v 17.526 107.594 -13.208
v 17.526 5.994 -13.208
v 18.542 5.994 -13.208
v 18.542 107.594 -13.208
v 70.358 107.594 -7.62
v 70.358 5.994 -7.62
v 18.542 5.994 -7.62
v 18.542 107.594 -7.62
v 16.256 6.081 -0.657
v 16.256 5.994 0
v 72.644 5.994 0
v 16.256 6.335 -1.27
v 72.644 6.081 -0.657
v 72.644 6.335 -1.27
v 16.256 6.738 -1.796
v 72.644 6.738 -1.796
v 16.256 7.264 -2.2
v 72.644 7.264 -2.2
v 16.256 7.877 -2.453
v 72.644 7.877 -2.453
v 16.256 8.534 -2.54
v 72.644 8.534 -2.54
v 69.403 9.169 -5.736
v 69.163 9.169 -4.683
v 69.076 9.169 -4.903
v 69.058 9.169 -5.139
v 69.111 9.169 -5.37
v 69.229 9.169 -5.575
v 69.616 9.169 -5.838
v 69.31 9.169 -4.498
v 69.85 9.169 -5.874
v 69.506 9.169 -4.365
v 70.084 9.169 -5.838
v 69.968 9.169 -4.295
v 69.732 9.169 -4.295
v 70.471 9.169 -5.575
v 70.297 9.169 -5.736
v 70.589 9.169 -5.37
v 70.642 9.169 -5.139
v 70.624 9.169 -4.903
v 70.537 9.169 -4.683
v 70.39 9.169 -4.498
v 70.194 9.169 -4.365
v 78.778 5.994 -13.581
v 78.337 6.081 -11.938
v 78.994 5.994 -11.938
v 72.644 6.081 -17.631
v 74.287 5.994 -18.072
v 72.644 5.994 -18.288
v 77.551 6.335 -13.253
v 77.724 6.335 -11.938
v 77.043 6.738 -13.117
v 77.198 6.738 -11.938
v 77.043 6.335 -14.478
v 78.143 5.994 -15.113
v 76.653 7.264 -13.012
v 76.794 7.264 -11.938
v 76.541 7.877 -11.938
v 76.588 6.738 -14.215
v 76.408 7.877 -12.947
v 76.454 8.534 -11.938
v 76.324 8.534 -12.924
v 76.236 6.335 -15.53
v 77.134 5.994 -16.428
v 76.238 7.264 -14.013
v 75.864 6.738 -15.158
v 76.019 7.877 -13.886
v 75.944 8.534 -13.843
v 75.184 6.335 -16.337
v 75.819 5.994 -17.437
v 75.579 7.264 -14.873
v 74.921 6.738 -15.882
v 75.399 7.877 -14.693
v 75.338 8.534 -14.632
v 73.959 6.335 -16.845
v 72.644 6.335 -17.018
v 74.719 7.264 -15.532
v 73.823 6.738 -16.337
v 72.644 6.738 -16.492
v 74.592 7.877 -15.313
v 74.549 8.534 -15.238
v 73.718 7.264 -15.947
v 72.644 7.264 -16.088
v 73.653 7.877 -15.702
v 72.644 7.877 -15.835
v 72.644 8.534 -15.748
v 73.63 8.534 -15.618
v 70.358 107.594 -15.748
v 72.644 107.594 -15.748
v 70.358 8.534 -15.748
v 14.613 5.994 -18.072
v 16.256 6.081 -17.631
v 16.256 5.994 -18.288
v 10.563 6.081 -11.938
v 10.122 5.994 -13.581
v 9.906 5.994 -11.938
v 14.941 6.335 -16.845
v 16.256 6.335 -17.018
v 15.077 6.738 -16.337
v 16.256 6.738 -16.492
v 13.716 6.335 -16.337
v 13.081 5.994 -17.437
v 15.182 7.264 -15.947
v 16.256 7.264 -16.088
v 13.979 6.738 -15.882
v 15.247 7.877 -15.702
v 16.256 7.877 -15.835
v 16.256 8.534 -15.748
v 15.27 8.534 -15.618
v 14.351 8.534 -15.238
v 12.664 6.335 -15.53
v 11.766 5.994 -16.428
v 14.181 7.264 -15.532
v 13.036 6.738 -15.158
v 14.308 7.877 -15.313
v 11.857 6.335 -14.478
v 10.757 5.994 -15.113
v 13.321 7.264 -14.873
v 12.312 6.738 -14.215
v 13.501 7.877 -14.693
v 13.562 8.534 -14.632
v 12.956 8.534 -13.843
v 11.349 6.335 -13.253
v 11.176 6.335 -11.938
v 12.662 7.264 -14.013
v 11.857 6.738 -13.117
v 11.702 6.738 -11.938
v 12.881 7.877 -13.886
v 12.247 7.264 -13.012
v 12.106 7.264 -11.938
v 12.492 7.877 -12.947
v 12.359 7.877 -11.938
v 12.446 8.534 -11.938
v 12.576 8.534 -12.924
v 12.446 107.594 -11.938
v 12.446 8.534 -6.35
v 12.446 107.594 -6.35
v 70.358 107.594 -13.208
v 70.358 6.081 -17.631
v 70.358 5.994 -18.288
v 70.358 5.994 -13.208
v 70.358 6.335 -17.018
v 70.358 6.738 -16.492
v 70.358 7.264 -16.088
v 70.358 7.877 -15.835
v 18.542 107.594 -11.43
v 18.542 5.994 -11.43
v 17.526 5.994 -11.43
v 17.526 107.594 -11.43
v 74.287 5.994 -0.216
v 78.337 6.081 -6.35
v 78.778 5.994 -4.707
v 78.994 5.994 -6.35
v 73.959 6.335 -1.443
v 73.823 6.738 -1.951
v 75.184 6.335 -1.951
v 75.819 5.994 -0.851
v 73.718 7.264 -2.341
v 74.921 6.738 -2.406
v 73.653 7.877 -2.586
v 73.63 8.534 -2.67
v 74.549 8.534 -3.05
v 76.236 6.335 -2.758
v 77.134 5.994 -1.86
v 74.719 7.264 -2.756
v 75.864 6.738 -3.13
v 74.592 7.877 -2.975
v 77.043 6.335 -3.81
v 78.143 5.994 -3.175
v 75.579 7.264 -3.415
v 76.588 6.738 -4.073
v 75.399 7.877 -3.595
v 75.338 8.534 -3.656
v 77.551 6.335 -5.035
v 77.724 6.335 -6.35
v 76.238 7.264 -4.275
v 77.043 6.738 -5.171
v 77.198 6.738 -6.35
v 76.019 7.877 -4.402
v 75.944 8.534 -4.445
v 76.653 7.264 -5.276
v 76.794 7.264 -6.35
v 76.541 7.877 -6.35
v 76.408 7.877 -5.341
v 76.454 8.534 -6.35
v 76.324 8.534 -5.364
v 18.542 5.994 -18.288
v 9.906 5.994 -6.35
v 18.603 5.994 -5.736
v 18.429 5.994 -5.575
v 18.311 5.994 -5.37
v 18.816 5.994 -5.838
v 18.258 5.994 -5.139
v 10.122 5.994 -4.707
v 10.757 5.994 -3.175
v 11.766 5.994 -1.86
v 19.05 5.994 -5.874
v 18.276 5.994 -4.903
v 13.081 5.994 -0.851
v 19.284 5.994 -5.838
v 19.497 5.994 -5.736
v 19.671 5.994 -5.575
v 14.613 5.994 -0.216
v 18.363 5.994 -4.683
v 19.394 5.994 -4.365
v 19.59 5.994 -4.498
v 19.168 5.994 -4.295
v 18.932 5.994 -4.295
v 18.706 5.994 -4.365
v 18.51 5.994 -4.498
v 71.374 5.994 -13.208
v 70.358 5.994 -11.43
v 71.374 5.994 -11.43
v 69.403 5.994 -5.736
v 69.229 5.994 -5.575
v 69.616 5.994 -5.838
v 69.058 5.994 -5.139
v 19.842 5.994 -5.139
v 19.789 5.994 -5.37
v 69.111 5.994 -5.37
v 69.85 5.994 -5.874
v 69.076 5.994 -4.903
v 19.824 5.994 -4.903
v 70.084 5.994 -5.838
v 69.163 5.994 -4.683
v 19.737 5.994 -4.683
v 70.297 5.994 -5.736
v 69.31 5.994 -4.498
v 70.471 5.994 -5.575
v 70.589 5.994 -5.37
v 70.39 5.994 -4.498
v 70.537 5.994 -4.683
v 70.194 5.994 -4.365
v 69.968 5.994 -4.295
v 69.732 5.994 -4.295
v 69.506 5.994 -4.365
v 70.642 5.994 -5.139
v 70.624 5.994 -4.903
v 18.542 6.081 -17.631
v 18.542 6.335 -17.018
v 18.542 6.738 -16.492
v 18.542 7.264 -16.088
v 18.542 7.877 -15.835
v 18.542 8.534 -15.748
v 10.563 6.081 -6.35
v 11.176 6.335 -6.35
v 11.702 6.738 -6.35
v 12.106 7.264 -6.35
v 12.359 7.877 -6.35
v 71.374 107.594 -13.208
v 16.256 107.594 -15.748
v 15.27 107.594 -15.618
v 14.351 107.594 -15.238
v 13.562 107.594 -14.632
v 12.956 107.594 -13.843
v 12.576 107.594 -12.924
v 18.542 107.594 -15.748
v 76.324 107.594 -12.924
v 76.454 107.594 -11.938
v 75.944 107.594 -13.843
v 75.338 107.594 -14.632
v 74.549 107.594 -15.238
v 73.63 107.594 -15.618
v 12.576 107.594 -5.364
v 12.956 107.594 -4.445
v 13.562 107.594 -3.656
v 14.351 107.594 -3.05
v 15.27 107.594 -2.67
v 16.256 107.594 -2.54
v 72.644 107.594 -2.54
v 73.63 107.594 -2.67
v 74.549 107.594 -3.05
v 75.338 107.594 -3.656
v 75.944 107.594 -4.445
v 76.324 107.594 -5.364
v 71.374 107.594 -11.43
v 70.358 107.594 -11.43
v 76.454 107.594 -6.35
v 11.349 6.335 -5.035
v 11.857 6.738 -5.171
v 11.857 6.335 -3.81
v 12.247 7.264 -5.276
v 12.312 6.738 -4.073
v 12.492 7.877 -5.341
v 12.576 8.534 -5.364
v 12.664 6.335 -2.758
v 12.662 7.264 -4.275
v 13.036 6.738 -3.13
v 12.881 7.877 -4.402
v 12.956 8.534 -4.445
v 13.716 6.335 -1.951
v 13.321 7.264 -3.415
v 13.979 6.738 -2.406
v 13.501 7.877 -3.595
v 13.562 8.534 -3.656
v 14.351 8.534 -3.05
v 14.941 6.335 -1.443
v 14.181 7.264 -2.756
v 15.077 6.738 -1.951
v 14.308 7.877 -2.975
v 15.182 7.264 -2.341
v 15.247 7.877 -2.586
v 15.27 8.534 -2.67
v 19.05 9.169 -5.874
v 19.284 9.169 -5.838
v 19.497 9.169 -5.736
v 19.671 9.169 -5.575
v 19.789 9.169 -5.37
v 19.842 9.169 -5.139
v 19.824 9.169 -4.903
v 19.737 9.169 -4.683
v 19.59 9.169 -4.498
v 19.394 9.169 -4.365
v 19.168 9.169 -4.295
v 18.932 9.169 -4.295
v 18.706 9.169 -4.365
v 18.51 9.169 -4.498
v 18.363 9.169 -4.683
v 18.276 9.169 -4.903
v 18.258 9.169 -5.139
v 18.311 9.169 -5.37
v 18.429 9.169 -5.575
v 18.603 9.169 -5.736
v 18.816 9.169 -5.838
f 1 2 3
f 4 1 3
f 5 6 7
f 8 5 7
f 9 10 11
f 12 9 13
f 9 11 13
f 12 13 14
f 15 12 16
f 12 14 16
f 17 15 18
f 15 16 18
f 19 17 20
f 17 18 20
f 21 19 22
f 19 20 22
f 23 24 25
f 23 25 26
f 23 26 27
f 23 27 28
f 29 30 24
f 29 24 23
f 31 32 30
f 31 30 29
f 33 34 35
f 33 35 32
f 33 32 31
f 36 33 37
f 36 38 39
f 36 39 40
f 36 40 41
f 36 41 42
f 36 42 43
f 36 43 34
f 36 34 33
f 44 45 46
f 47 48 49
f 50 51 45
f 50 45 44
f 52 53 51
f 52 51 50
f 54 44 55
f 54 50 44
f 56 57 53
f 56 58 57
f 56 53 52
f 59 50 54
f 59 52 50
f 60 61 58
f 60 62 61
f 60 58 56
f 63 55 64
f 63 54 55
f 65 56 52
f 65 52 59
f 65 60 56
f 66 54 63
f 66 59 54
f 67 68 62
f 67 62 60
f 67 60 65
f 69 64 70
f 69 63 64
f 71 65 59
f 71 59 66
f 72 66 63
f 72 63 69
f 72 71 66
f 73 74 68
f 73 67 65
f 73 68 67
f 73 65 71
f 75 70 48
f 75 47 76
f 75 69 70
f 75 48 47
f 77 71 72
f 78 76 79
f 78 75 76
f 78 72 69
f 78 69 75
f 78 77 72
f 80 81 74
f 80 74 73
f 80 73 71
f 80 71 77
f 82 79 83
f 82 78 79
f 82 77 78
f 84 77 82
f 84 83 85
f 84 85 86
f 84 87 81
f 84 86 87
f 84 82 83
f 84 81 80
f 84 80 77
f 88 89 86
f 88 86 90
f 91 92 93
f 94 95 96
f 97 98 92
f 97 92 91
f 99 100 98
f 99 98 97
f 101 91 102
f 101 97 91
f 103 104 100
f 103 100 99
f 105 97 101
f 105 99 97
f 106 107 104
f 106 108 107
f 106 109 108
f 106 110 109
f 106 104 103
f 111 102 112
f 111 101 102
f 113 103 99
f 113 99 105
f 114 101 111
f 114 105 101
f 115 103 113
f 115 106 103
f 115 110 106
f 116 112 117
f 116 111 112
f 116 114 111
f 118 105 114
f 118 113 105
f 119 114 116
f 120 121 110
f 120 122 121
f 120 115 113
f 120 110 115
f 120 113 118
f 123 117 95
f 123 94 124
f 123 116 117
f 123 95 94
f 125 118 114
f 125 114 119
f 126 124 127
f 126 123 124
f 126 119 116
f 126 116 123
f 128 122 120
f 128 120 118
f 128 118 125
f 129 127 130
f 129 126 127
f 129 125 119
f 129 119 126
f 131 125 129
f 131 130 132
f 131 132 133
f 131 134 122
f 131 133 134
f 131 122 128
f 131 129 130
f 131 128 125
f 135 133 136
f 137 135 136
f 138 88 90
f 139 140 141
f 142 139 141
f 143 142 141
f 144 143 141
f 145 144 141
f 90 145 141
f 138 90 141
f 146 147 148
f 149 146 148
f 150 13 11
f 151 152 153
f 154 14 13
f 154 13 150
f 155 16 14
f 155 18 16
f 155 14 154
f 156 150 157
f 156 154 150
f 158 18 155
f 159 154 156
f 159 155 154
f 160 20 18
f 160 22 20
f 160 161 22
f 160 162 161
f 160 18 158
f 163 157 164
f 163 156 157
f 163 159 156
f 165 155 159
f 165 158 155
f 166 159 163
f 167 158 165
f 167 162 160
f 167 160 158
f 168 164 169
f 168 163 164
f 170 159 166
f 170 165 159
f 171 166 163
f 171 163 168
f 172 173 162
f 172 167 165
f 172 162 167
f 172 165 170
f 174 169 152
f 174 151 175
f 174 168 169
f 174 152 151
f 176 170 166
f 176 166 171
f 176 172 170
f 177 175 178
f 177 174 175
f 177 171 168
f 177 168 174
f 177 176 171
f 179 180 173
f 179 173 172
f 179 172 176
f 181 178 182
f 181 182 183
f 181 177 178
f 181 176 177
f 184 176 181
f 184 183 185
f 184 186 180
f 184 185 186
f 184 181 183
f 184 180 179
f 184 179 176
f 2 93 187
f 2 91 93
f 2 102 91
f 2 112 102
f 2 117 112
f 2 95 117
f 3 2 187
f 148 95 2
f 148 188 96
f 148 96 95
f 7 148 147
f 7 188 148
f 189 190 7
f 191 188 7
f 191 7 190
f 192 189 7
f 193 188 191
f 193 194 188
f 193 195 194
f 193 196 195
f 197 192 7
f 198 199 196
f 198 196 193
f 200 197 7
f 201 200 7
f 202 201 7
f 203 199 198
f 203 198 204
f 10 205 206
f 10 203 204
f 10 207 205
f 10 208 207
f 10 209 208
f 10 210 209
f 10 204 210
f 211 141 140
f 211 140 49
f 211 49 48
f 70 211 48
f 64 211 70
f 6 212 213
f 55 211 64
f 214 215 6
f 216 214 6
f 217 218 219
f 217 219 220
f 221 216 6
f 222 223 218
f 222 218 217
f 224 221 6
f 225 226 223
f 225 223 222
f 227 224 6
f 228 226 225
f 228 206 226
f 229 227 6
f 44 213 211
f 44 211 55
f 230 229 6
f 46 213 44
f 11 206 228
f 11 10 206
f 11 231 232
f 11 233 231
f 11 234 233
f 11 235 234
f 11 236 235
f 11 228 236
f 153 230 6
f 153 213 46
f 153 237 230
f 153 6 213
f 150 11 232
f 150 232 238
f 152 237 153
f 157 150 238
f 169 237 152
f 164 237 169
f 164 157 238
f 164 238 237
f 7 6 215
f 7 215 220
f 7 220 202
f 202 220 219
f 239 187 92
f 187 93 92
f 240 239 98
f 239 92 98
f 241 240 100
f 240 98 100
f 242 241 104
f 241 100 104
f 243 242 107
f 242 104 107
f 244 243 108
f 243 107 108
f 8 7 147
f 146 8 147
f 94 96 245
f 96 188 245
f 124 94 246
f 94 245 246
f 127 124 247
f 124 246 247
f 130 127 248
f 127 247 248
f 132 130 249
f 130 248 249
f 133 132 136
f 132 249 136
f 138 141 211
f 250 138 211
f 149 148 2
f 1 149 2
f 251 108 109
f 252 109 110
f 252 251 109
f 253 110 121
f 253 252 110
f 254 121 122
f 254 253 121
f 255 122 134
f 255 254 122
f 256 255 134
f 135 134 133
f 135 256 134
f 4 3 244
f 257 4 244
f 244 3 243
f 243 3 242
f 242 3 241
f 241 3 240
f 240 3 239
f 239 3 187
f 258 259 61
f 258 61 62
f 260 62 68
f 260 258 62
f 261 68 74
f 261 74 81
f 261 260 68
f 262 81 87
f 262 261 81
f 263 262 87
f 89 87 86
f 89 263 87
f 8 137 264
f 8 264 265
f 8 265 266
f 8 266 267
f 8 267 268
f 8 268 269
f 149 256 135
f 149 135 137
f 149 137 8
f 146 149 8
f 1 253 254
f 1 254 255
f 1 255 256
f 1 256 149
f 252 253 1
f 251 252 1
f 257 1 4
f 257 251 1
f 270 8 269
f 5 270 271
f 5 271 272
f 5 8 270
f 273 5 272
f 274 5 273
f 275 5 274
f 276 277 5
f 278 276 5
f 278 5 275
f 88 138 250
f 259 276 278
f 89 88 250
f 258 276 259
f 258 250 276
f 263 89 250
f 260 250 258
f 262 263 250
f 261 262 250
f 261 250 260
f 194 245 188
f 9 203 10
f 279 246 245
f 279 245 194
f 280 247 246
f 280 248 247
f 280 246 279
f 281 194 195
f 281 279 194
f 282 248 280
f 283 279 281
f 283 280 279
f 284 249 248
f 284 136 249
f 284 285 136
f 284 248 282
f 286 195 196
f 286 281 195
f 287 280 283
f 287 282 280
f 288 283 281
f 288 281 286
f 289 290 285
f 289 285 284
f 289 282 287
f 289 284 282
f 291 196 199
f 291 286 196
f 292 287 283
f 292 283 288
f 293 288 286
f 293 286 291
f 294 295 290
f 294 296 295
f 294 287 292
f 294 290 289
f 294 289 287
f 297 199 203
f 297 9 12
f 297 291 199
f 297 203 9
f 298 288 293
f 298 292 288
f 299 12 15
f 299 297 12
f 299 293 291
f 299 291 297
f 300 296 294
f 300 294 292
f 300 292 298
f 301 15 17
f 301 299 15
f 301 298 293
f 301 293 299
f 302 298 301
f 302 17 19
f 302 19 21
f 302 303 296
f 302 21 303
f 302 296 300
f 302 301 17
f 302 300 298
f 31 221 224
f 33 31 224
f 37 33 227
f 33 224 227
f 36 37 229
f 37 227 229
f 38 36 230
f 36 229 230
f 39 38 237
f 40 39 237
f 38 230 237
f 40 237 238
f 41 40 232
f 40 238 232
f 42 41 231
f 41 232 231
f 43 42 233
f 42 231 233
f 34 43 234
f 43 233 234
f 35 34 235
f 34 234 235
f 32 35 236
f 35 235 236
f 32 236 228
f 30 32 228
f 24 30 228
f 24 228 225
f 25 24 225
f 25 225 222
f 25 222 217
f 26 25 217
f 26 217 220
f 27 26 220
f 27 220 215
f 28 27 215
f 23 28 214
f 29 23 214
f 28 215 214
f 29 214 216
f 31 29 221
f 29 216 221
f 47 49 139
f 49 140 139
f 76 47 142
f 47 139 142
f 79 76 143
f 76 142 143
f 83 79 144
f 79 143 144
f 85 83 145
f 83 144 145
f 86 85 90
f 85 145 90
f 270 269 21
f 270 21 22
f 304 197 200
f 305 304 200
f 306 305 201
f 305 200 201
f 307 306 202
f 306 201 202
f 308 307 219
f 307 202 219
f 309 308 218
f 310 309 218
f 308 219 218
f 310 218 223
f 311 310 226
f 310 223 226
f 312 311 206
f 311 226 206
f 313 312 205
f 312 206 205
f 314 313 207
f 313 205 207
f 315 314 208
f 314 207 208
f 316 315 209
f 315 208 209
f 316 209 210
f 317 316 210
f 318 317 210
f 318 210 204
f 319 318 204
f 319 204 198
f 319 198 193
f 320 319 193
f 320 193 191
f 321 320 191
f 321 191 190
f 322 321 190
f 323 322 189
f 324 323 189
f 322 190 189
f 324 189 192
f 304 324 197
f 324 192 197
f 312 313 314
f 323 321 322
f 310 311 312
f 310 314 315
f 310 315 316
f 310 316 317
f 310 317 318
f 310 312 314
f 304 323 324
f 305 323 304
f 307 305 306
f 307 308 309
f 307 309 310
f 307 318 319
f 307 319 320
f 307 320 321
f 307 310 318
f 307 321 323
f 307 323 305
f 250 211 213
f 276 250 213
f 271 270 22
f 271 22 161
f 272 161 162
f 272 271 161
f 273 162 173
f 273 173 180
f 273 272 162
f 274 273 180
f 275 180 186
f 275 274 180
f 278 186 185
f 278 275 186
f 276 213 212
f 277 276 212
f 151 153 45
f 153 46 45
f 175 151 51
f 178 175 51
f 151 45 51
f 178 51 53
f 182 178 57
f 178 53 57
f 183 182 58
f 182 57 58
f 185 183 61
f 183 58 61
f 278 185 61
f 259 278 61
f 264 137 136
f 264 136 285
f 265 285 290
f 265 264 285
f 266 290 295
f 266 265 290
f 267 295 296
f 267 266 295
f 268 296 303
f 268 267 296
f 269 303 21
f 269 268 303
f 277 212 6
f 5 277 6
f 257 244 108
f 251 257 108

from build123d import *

# Parameters (mm, degrees)
SKETCH2_W               = 88.9
SKETCH2_H               = 152.4
BOSS_EXTRUDE1_DEPTH     = 5.9944
CUT_EXTRUDE2_DEPTH      = 177.535840076
CUT_EXTRUDE2_DEPTH_BACK = 177.535840076
SKETCH4_R               = 2.7305
BOSS_EXTRUDE2_DEPTH     = 101.6
FILLET1_R               = 3.81
FILLET2_R               = 2.54
BOSS_EXTRUDE3_DEPTH     = 20.32
FILLET3_R               = 3.81
FILLET6_R               = 3.81
FILLET7_R               = 2.54
CUT_EXTRUDE3_DEPTH      = 204.596488182
CUT_EXTRUDE3_DEPTH_BACK = 204.596488182
SKETCH7_W               = 2.54
SKETCH7_H               = 152.4
SKETCH8_W               = 86.36
SKETCH8_H               = 152.4
CUT_EXTRUDE5_DEPTH      = 5.9944
SKETCH9_R               = 0.79375
CUT_EXTRUDE6_DEPTH      = 3.175


with BuildPart() as part:
    # Sketch2 → Boss-Extrude1 (new body)
    with BuildSketch(Plane(origin=(0, 0, 0), x_dir=(1, 0, 0), z_dir=(0, 1, 0))):
        with Locations((44.45, 76.2)):
            Rectangle(SKETCH2_W, SKETCH2_H)
    extrude(amount=BOSS_EXTRUDE1_DEPTH)

    # Sketch4 → Cut-Extrude2 (cut, two sides: drawn at the far end of the back side and taken through both)
    with BuildSketch(Plane(origin=(0, 5.9944, 0), x_dir=(1, 0, 0), z_dir=(0, 1, 0)).offset(-CUT_EXTRUDE2_DEPTH_BACK)):
        with Locations(Location((45.72, 109.871331367, 0), (0, 0, 270))):
            Circle(SKETCH4_R)
        with Locations(Location((45.72, 33.671331367, 0), (0, 0, 270))):
            Circle(SKETCH4_R)
    extrude(amount=CUT_EXTRUDE2_DEPTH + CUT_EXTRUDE2_DEPTH_BACK, mode=Mode.SUBTRACT)

    # Sketch5 → Boss-Extrude2 (add)
    with BuildSketch(Plane(origin=(0, 5.9944, 0), x_dir=(1, 0, 0), z_dir=(0, 1, 0))):
        Polygon((18.542, 15.748), (12.446, 15.748), (12.446, 2.54), (76.454, 2.54), (76.454, 15.748), (70.358, 15.748), (70.358, 13.208), (71.374, 13.208), (71.374, 11.43), (70.358, 11.43), (70.358, 7.62), (18.542, 7.62), (18.542, 11.43), (17.526, 11.43), (17.526, 13.208), (18.542, 13.208), align=None)
    extrude(amount=BOSS_EXTRUDE2_DEPTH)

    # Fillet1
    fillet1_edges = [part.edges().sort_by_distance(p)[0] for p in [
        (12.446, 56.7944, -15.748),
        (12.446, 56.7944, -2.54),
        (76.454, 56.7944, -2.54),
        (76.454, 56.7944, -15.748),
    ]]
    fillet(fillet1_edges, radius=FILLET1_R)

    # Fillet2
    fillet2_edges = [part.edges().sort_by_distance(p)[0] for p in [
        (71.501, 5.9944, -15.748),
        (44.45, 5.9944, -2.54),
        (12.446, 5.9944, -9.144),
        (17.399, 5.9944, -15.748),
        (76.454, 5.9944, -9.144),
        (13.561923164, 5.9944, -3.655923164),
        (13.561923164, 5.9944, -14.632076836),
        (75.338076836, 5.9944, -3.655923164),
        (75.338076836, 5.9944, -14.632076836),
    ]]
    fillet(fillet2_edges, radius=FILLET2_R - 0.0001)  # a hair under: the kernel refuses the full size

    # Sketch6 → Boss-Extrude3 (add, symmetric)
    with BuildSketch(Plane.ZY.offset(-44.45)):
        Polygon((-149.86, 5.9944), (-79.121, 5.9944), (-79.121, 23.1394), (-86.106, 23.1394), (-86.106, 18.0594), (-84.201, 18.0594), (-84.201, 16.1544), (-86.106, 16.1544), (-86.106, 11.0744), (-142.875, 11.0744), (-142.875, 16.1544), (-144.78, 16.1544), (-144.78, 18.0594), (-142.875, 18.0594), (-142.875, 23.1394), (-149.86, 23.1394), align=None)
    extrude(amount=BOSS_EXTRUDE3_DEPTH, both=True)

    # Fillet3
    fillet3_edges = [part.edges().sort_by_distance(p)[0] for p in [
        (44.45, 23.1394, -149.86),
        (44.45, 23.1394, -79.121),
    ]]
    fillet(fillet3_edges, radius=FILLET3_R)

    # Fillet6
    fillet6_edges = [part.edges().sort_by_distance(p)[0] for p in [
        (24.13, 12.6619, -149.86),
        (64.77, 12.6619, -79.121),
        (24.13, 23.1394, -84.5185),
        (24.13, 12.6619, -79.121),
        (64.77, 23.1394, -84.5185),
        (64.77, 12.6619, -149.86),
        (64.77, 23.1394, -144.4625),
        (64.77, 22.023476836, -148.744076836),
        (64.77, 22.023476836, -80.236923164),
        (24.13, 23.1394, -144.4625),
        (24.13, 22.023476836, -148.744076836),
        (24.13, 22.023476836, -80.236923164),
    ]]
    fillet(fillet6_edges, radius=FILLET6_R)

    # Fillet7
    fillet7_edges = [part.edges().sort_by_distance(p)[0] for p in [
        (24.13, 5.9944, -114.4905),
        (64.77, 5.9944, -114.4905),
        (44.45, 5.9944, -79.121),
        (44.45, 5.9944, -149.86),
        (25.245923164, 5.9944, -80.236923164),
        (63.654076836, 5.9944, -80.236923164),
        (63.654076836, 5.9944, -148.744076836),
        (25.245923164, 5.9944, -148.744076836),
    ]]
    fillet(fillet7_edges, radius=FILLET7_R - 0.0001)  # a hair under: the kernel refuses the full size

    # Sketch7 → Cut-Extrude3 (cut, two sides: drawn at the far end of the back side and taken through both)
    with BuildSketch(Plane(origin=(0, 5.9944, 0), x_dir=(1, 0, 0), z_dir=(0, 1, 0)).offset(-CUT_EXTRUDE3_DEPTH_BACK)):
        with Locations((1.27, 76.2)):
            Rectangle(SKETCH7_W, SKETCH7_H)
    extrude(amount=CUT_EXTRUDE3_DEPTH + CUT_EXTRUDE3_DEPTH_BACK, mode=Mode.SUBTRACT)

    # Sketch8 → Cut-Extrude5 (cut)
    with BuildSketch(Plane.XZ):
        with Locations((45.72, -76.2)):
            Rectangle(SKETCH8_W, SKETCH8_H)
    extrude(amount=-CUT_EXTRUDE5_DEPTH, mode=Mode.SUBTRACT)


with BuildPart() as body_2:
    # of the pieces the cut leaves, the one that is kept (cut_extrude5_keep)
    add(part.part.solids().sort_by_distance((18.542, 8.5343, -15.748))[0])

    # Sketch9 → Cut-Extrude6 (cut)
    with BuildSketch(Plane.XZ.offset(-5.9944)):
        with Locations(Location((69.85, -5.08, 0), (0, 0, 270))):
            Circle(SKETCH9_R)
        with Locations(Location((19.05, -5.08, 0), (0, 0, 270))):
            Circle(SKETCH9_R)
    extrude(amount=-CUT_EXTRUDE6_DEPTH, mode=Mode.SUBTRACT)


solid = body_2.part
